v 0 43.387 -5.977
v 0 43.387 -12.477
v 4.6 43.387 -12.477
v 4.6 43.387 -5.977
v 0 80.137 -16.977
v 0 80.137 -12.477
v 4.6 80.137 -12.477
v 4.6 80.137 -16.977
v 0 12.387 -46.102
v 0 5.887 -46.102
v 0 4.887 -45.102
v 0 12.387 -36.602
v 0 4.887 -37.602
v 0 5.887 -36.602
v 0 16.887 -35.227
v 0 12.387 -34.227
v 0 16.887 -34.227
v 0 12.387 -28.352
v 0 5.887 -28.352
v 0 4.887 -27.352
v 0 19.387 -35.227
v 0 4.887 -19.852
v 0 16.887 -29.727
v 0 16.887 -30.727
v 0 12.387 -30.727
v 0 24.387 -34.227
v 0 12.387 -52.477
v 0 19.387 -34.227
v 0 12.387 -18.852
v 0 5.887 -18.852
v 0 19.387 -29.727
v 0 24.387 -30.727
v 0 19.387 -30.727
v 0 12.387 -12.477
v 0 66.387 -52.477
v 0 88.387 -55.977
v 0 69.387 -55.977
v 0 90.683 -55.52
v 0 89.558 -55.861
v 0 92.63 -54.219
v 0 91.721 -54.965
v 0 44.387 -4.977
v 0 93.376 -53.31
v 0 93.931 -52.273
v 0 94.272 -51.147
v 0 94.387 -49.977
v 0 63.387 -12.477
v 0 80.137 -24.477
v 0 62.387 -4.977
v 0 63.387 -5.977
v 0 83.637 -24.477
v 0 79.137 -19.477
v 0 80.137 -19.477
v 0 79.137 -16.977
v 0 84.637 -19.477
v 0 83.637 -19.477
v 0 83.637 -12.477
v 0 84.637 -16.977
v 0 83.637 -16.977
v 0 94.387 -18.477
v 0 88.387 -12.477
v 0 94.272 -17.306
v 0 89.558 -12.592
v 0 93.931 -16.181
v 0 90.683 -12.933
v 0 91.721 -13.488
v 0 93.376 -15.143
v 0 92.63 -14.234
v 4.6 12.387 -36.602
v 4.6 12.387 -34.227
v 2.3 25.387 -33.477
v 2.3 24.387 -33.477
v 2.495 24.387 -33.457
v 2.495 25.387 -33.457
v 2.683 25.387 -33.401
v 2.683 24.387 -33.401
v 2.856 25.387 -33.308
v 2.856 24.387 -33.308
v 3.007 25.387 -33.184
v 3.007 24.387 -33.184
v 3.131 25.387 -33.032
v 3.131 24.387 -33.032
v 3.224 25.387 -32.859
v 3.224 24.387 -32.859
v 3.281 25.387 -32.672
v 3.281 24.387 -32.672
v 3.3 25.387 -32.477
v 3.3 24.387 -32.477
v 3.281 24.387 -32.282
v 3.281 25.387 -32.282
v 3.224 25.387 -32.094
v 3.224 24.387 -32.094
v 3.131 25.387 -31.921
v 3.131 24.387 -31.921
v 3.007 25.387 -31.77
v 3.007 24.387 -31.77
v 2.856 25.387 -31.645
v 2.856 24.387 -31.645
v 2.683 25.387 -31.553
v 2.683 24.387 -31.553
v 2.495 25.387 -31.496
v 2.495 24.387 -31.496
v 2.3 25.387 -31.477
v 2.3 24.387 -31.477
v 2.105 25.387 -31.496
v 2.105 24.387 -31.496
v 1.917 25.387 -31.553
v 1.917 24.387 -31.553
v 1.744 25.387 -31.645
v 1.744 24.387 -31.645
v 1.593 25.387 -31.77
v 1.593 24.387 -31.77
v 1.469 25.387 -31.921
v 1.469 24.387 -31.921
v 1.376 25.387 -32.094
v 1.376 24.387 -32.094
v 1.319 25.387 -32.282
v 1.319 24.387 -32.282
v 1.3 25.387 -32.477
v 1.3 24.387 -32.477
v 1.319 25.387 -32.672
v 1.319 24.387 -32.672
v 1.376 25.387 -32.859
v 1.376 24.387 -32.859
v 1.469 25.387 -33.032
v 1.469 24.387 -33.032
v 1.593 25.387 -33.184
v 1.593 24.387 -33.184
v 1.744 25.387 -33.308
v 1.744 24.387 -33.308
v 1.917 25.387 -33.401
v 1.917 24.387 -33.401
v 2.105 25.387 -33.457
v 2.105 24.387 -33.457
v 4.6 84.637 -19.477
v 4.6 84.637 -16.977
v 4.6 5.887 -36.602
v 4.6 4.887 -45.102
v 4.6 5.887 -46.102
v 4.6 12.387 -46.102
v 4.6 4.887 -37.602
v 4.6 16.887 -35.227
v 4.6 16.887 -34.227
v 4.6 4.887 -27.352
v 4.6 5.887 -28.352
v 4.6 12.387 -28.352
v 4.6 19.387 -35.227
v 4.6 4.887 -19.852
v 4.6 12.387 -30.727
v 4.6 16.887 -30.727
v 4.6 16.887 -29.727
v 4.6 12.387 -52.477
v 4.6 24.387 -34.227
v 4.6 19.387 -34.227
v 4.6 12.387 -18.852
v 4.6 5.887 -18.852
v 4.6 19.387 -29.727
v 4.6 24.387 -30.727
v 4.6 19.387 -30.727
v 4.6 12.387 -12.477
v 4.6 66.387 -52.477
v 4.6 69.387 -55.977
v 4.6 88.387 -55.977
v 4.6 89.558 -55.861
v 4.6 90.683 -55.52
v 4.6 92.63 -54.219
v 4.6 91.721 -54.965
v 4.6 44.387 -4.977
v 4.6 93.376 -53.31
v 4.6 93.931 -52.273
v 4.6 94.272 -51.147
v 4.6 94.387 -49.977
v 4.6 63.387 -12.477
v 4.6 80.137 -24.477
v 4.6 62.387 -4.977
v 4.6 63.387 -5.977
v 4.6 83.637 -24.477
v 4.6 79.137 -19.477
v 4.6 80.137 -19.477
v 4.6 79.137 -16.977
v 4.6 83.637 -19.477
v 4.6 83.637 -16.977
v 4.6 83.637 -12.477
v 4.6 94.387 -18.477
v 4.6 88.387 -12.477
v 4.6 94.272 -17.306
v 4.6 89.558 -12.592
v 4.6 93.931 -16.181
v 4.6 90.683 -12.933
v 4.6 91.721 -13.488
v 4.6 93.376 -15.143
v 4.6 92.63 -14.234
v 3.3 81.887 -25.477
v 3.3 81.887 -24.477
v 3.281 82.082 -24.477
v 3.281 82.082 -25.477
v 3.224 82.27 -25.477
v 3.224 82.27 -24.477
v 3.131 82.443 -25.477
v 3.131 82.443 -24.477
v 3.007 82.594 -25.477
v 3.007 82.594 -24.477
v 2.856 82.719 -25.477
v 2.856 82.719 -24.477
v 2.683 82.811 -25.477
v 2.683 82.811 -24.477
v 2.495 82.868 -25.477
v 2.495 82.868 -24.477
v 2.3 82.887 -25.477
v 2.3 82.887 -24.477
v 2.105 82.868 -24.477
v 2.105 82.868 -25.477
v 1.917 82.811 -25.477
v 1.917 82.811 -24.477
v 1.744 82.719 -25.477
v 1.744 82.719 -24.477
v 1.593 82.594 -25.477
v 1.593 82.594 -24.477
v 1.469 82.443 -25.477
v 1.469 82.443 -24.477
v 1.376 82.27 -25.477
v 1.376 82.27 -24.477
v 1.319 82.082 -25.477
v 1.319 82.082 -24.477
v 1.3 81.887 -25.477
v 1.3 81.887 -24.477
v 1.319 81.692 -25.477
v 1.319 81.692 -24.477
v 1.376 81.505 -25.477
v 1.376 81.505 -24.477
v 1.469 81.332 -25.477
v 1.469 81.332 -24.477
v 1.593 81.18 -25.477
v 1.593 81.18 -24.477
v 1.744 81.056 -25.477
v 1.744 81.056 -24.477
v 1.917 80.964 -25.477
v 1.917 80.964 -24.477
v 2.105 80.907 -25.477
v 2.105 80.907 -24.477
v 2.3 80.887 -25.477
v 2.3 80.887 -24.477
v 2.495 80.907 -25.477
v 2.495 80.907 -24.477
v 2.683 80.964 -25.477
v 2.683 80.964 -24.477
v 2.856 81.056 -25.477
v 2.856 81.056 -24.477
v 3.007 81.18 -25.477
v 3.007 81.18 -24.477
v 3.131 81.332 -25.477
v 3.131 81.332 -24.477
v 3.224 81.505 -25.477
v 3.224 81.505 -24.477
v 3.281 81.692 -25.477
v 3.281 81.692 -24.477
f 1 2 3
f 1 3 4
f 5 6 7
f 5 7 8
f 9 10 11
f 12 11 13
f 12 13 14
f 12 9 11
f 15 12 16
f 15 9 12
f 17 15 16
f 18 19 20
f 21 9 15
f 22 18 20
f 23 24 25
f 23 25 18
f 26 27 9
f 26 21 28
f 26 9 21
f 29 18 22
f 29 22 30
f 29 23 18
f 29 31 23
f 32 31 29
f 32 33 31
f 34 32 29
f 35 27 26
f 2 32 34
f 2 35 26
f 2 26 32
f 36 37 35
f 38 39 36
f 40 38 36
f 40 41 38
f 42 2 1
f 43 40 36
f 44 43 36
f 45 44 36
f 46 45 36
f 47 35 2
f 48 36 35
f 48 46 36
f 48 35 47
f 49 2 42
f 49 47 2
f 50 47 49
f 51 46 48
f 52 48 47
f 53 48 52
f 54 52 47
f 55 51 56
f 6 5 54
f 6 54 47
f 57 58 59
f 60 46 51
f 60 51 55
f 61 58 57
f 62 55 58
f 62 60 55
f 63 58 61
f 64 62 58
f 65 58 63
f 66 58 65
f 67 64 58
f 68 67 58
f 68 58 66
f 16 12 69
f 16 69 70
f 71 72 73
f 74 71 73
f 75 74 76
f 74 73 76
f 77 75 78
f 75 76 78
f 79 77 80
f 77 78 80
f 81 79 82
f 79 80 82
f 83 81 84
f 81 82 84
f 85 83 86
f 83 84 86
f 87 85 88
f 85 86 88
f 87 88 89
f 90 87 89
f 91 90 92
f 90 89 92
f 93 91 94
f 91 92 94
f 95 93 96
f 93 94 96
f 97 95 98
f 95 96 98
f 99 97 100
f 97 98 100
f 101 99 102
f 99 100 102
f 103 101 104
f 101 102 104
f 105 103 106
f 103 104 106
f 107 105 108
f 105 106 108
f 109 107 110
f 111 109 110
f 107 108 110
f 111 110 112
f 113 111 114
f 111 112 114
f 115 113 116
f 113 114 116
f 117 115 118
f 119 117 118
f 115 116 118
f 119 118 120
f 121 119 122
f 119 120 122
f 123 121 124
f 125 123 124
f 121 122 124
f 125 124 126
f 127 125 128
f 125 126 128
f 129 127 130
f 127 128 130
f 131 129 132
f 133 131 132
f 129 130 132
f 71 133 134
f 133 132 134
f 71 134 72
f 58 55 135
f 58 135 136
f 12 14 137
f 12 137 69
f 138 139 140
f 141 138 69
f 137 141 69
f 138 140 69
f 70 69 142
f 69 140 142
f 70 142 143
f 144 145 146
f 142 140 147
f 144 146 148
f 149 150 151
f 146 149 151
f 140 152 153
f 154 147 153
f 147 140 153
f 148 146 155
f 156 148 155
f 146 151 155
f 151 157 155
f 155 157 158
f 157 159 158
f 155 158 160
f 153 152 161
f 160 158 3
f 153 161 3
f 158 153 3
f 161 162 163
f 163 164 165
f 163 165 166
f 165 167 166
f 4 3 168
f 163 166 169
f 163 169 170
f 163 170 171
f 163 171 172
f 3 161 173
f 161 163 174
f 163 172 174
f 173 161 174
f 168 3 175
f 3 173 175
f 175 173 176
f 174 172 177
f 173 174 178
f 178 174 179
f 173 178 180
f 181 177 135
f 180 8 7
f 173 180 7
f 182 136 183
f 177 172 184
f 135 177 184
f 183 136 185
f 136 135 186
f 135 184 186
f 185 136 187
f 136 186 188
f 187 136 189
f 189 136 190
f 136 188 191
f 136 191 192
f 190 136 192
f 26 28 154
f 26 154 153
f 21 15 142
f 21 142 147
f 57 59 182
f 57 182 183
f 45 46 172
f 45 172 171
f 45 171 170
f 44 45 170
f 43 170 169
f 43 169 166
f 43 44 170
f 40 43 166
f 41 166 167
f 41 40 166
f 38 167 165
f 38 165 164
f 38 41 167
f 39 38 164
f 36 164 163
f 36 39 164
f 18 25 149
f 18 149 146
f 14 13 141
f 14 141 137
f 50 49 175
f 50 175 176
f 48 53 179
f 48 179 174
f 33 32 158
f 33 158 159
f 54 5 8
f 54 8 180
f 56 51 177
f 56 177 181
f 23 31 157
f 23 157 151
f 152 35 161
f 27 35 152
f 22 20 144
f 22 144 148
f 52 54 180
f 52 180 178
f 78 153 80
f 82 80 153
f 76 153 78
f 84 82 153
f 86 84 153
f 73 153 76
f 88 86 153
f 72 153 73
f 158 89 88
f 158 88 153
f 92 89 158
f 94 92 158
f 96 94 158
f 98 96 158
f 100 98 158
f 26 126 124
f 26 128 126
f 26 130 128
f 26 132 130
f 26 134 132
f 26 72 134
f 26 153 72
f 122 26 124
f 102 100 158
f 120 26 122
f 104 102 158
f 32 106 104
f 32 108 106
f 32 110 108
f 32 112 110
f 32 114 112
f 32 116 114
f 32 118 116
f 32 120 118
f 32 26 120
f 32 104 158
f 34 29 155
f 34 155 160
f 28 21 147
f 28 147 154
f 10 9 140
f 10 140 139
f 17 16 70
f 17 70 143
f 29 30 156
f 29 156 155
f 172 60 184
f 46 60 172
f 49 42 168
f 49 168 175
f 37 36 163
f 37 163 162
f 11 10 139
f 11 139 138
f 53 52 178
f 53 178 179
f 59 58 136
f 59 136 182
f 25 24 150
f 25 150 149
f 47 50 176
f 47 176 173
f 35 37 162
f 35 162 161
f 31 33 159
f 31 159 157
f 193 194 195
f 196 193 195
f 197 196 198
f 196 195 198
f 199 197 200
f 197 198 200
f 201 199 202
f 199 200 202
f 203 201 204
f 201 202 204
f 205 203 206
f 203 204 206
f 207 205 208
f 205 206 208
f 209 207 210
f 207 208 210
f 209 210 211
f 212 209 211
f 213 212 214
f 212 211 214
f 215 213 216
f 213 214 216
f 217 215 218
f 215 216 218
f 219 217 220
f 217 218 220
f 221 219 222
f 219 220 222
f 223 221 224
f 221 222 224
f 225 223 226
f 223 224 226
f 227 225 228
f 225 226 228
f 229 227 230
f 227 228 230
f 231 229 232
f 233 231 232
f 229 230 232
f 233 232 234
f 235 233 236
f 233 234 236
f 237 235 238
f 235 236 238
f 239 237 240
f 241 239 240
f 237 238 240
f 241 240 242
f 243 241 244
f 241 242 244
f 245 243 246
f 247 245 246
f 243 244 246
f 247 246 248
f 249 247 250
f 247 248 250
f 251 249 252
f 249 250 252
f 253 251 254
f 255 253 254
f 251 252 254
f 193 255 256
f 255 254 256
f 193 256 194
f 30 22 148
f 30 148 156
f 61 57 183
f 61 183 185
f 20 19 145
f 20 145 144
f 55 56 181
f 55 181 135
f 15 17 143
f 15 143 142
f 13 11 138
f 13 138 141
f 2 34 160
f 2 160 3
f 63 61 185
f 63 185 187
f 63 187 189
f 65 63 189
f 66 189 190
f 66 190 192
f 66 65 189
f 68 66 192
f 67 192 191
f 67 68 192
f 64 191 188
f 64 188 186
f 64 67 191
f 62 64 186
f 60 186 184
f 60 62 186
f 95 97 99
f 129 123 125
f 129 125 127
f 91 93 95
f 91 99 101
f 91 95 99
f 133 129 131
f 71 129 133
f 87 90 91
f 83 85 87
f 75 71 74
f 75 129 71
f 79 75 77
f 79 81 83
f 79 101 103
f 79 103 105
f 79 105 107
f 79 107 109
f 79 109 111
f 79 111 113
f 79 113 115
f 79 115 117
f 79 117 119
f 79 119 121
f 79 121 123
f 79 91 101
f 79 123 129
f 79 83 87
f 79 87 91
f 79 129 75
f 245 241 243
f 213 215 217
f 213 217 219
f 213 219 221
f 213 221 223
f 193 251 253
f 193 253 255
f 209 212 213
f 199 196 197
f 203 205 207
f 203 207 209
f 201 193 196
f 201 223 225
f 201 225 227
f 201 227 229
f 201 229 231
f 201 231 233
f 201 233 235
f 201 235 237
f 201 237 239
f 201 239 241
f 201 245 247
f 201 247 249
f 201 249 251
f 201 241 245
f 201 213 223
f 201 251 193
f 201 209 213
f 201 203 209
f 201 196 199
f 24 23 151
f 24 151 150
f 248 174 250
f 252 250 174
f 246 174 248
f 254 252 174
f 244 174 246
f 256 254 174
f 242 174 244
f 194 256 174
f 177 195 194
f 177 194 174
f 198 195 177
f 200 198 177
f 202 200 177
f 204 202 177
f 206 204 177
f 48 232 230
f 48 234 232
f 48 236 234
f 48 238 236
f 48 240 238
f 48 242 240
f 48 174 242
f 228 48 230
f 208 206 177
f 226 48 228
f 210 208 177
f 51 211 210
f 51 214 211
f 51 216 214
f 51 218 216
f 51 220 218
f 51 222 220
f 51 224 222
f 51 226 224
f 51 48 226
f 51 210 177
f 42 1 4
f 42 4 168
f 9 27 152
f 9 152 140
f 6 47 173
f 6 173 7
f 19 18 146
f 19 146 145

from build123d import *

# Parameters (mm, degrees)
EXTRUDE1_DEPTH = 4.6
SKETCH2_R      = 1
EXTRUDE2_DEPTH = 1
SKETCH3_R      = 1
EXTRUDE3_DEPTH = 1


with BuildPart() as part:
    # Sketch1 → Extrude1 (new body)
    with BuildSketch(Plane(origin=(0, 0, 0), x_dir=(0, 0, -1), z_dir=(1, 0, 0))):
        with BuildLine():
            Line((28.351631804, 12.38738065), (28.351631804, 5.88738065))
            Line((28.351631804, 5.88738065), (27.351631804, 4.88738065))
            Line((27.351631804, 4.88738065), (19.851631804, 4.88738065))
            Line((19.851631804, 4.88738065), (18.851631804, 5.88738065))
            Line((18.851631804, 5.88738065), (18.851631804, 12.38738065))
            Line((18.851631804, 12.38738065), (12.476631804, 12.38738065))
            Line((12.476631804, 12.38738065), (12.476631804, 43.38738065))
            Line((12.476631804, 43.38738065), (5.976631804, 43.38738065))
            Line((5.976631804, 43.38738065), (4.976631804, 44.38738065))
            Line((4.976631804, 44.38738065), (4.976631804, 62.38738065))
            Line((4.976631804, 62.38738065), (5.976631804, 63.38738065))
            Line((5.976631804, 63.38738065), (12.476631804, 63.38738065))
            Line((12.476631804, 63.38738065), (12.476631804, 80.13738065))
            Line((12.476631804, 80.13738065), (16.976631804, 80.13738065))
            Line((16.976631804, 80.13738065), (16.976631804, 79.13738065))
            Line((16.976631804, 79.13738065), (19.476631804, 79.13738065))
            Line((19.476631804, 79.13738065), (19.476631804, 80.13738065))
            Line((19.476631804, 80.13738065), (24.476631804, 80.13738065))
            Line((24.476631804, 80.13738065), (24.476631804, 83.63738065))
            Line((24.476631804, 83.63738065), (19.476631804, 83.63738065))
            Line((19.476631804, 83.63738065), (19.476631804, 84.63738065))
            Line((19.476631804, 84.63738065), (16.976631804, 84.63738065))
            Line((16.976631804, 84.63738065), (16.976631804, 83.63738065))
            Line((16.976631804, 83.63738065), (12.476631804, 83.63738065))
            Line((12.476631804, 83.63738065), (12.476631804, 88.38738065))
            ThreePointArc((12.476631804, 88.38738065), (14.233991117, 92.630021337), (18.476631804, 94.38738065))
            Line((18.476631804, 94.38738065), (49.976631804, 94.38738065))
            ThreePointArc((49.976631804, 94.38738065), (54.219272491, 92.630021337), (55.976631804, 88.38738065))
            Line((55.976631804, 88.38738065), (55.976631804, 69.38738065))
            Line((55.976631804, 69.38738065), (52.476631804, 66.38738065))
            Line((52.476631804, 66.38738065), (52.476631804, 12.38738065))
            Line((52.476631804, 12.38738065), (46.101631804, 12.38738065))
            Line((46.101631804, 12.38738065), (46.101631804, 5.88738065))
            Line((46.101631804, 5.88738065), (45.101631804, 4.88738065))
            Line((45.101631804, 4.88738065), (37.601631804, 4.88738065))
            Line((37.601631804, 4.88738065), (36.601631804, 5.88738065))
            Line((36.601631804, 5.88738065), (36.601631804, 12.38738065))
            Line((36.601631804, 12.38738065), (34.226631804, 12.38738065))
            Line((34.226631804, 12.38738065), (34.226631804, 16.88738065))
            Line((34.226631804, 16.88738065), (35.226631804, 16.88738065))
            Line((35.226631804, 16.88738065), (35.226631804, 19.38738065))
            Line((35.226631804, 19.38738065), (34.226631804, 19.38738065))
            Line((34.226631804, 19.38738065), (34.226631804, 24.38738065))
            Line((34.226631804, 24.38738065), (30.726631804, 24.38738065))
            Line((30.726631804, 24.38738065), (30.726631804, 19.38738065))
            Line((30.726631804, 19.38738065), (29.726631804, 19.38738065))
            Line((29.726631804, 19.38738065), (29.726631804, 16.88738065))
            Line((29.726631804, 16.88738065), (30.726631804, 16.88738065))
            Line((30.726631804, 16.88738065), (30.726631804, 12.38738065))
            Line((30.726631804, 12.38738065), (28.351631804, 12.38738065))
        make_face()
    extrude(amount=EXTRUDE1_DEPTH)

    # Sketch2 → Extrude2 (cut)
    with BuildSketch(Plane.XY.offset(-24.476631804)):
        with Locations((2.3, 81.88738065)):
            Circle(SKETCH2_R)
    extrude(amount=-EXTRUDE2_DEPTH, mode=Mode.SUBTRACT)

    # Sketch3 → Extrude3 (cut)
    with BuildSketch(Plane.XZ.offset(-24.38738065)):
        with Locations(Location((2.3, -32.476631804, 0), (0, 0, 270))):
            Circle(SKETCH3_R)
    extrude(amount=-EXTRUDE3_DEPTH, mode=Mode.SUBTRACT)


solid = part.part
